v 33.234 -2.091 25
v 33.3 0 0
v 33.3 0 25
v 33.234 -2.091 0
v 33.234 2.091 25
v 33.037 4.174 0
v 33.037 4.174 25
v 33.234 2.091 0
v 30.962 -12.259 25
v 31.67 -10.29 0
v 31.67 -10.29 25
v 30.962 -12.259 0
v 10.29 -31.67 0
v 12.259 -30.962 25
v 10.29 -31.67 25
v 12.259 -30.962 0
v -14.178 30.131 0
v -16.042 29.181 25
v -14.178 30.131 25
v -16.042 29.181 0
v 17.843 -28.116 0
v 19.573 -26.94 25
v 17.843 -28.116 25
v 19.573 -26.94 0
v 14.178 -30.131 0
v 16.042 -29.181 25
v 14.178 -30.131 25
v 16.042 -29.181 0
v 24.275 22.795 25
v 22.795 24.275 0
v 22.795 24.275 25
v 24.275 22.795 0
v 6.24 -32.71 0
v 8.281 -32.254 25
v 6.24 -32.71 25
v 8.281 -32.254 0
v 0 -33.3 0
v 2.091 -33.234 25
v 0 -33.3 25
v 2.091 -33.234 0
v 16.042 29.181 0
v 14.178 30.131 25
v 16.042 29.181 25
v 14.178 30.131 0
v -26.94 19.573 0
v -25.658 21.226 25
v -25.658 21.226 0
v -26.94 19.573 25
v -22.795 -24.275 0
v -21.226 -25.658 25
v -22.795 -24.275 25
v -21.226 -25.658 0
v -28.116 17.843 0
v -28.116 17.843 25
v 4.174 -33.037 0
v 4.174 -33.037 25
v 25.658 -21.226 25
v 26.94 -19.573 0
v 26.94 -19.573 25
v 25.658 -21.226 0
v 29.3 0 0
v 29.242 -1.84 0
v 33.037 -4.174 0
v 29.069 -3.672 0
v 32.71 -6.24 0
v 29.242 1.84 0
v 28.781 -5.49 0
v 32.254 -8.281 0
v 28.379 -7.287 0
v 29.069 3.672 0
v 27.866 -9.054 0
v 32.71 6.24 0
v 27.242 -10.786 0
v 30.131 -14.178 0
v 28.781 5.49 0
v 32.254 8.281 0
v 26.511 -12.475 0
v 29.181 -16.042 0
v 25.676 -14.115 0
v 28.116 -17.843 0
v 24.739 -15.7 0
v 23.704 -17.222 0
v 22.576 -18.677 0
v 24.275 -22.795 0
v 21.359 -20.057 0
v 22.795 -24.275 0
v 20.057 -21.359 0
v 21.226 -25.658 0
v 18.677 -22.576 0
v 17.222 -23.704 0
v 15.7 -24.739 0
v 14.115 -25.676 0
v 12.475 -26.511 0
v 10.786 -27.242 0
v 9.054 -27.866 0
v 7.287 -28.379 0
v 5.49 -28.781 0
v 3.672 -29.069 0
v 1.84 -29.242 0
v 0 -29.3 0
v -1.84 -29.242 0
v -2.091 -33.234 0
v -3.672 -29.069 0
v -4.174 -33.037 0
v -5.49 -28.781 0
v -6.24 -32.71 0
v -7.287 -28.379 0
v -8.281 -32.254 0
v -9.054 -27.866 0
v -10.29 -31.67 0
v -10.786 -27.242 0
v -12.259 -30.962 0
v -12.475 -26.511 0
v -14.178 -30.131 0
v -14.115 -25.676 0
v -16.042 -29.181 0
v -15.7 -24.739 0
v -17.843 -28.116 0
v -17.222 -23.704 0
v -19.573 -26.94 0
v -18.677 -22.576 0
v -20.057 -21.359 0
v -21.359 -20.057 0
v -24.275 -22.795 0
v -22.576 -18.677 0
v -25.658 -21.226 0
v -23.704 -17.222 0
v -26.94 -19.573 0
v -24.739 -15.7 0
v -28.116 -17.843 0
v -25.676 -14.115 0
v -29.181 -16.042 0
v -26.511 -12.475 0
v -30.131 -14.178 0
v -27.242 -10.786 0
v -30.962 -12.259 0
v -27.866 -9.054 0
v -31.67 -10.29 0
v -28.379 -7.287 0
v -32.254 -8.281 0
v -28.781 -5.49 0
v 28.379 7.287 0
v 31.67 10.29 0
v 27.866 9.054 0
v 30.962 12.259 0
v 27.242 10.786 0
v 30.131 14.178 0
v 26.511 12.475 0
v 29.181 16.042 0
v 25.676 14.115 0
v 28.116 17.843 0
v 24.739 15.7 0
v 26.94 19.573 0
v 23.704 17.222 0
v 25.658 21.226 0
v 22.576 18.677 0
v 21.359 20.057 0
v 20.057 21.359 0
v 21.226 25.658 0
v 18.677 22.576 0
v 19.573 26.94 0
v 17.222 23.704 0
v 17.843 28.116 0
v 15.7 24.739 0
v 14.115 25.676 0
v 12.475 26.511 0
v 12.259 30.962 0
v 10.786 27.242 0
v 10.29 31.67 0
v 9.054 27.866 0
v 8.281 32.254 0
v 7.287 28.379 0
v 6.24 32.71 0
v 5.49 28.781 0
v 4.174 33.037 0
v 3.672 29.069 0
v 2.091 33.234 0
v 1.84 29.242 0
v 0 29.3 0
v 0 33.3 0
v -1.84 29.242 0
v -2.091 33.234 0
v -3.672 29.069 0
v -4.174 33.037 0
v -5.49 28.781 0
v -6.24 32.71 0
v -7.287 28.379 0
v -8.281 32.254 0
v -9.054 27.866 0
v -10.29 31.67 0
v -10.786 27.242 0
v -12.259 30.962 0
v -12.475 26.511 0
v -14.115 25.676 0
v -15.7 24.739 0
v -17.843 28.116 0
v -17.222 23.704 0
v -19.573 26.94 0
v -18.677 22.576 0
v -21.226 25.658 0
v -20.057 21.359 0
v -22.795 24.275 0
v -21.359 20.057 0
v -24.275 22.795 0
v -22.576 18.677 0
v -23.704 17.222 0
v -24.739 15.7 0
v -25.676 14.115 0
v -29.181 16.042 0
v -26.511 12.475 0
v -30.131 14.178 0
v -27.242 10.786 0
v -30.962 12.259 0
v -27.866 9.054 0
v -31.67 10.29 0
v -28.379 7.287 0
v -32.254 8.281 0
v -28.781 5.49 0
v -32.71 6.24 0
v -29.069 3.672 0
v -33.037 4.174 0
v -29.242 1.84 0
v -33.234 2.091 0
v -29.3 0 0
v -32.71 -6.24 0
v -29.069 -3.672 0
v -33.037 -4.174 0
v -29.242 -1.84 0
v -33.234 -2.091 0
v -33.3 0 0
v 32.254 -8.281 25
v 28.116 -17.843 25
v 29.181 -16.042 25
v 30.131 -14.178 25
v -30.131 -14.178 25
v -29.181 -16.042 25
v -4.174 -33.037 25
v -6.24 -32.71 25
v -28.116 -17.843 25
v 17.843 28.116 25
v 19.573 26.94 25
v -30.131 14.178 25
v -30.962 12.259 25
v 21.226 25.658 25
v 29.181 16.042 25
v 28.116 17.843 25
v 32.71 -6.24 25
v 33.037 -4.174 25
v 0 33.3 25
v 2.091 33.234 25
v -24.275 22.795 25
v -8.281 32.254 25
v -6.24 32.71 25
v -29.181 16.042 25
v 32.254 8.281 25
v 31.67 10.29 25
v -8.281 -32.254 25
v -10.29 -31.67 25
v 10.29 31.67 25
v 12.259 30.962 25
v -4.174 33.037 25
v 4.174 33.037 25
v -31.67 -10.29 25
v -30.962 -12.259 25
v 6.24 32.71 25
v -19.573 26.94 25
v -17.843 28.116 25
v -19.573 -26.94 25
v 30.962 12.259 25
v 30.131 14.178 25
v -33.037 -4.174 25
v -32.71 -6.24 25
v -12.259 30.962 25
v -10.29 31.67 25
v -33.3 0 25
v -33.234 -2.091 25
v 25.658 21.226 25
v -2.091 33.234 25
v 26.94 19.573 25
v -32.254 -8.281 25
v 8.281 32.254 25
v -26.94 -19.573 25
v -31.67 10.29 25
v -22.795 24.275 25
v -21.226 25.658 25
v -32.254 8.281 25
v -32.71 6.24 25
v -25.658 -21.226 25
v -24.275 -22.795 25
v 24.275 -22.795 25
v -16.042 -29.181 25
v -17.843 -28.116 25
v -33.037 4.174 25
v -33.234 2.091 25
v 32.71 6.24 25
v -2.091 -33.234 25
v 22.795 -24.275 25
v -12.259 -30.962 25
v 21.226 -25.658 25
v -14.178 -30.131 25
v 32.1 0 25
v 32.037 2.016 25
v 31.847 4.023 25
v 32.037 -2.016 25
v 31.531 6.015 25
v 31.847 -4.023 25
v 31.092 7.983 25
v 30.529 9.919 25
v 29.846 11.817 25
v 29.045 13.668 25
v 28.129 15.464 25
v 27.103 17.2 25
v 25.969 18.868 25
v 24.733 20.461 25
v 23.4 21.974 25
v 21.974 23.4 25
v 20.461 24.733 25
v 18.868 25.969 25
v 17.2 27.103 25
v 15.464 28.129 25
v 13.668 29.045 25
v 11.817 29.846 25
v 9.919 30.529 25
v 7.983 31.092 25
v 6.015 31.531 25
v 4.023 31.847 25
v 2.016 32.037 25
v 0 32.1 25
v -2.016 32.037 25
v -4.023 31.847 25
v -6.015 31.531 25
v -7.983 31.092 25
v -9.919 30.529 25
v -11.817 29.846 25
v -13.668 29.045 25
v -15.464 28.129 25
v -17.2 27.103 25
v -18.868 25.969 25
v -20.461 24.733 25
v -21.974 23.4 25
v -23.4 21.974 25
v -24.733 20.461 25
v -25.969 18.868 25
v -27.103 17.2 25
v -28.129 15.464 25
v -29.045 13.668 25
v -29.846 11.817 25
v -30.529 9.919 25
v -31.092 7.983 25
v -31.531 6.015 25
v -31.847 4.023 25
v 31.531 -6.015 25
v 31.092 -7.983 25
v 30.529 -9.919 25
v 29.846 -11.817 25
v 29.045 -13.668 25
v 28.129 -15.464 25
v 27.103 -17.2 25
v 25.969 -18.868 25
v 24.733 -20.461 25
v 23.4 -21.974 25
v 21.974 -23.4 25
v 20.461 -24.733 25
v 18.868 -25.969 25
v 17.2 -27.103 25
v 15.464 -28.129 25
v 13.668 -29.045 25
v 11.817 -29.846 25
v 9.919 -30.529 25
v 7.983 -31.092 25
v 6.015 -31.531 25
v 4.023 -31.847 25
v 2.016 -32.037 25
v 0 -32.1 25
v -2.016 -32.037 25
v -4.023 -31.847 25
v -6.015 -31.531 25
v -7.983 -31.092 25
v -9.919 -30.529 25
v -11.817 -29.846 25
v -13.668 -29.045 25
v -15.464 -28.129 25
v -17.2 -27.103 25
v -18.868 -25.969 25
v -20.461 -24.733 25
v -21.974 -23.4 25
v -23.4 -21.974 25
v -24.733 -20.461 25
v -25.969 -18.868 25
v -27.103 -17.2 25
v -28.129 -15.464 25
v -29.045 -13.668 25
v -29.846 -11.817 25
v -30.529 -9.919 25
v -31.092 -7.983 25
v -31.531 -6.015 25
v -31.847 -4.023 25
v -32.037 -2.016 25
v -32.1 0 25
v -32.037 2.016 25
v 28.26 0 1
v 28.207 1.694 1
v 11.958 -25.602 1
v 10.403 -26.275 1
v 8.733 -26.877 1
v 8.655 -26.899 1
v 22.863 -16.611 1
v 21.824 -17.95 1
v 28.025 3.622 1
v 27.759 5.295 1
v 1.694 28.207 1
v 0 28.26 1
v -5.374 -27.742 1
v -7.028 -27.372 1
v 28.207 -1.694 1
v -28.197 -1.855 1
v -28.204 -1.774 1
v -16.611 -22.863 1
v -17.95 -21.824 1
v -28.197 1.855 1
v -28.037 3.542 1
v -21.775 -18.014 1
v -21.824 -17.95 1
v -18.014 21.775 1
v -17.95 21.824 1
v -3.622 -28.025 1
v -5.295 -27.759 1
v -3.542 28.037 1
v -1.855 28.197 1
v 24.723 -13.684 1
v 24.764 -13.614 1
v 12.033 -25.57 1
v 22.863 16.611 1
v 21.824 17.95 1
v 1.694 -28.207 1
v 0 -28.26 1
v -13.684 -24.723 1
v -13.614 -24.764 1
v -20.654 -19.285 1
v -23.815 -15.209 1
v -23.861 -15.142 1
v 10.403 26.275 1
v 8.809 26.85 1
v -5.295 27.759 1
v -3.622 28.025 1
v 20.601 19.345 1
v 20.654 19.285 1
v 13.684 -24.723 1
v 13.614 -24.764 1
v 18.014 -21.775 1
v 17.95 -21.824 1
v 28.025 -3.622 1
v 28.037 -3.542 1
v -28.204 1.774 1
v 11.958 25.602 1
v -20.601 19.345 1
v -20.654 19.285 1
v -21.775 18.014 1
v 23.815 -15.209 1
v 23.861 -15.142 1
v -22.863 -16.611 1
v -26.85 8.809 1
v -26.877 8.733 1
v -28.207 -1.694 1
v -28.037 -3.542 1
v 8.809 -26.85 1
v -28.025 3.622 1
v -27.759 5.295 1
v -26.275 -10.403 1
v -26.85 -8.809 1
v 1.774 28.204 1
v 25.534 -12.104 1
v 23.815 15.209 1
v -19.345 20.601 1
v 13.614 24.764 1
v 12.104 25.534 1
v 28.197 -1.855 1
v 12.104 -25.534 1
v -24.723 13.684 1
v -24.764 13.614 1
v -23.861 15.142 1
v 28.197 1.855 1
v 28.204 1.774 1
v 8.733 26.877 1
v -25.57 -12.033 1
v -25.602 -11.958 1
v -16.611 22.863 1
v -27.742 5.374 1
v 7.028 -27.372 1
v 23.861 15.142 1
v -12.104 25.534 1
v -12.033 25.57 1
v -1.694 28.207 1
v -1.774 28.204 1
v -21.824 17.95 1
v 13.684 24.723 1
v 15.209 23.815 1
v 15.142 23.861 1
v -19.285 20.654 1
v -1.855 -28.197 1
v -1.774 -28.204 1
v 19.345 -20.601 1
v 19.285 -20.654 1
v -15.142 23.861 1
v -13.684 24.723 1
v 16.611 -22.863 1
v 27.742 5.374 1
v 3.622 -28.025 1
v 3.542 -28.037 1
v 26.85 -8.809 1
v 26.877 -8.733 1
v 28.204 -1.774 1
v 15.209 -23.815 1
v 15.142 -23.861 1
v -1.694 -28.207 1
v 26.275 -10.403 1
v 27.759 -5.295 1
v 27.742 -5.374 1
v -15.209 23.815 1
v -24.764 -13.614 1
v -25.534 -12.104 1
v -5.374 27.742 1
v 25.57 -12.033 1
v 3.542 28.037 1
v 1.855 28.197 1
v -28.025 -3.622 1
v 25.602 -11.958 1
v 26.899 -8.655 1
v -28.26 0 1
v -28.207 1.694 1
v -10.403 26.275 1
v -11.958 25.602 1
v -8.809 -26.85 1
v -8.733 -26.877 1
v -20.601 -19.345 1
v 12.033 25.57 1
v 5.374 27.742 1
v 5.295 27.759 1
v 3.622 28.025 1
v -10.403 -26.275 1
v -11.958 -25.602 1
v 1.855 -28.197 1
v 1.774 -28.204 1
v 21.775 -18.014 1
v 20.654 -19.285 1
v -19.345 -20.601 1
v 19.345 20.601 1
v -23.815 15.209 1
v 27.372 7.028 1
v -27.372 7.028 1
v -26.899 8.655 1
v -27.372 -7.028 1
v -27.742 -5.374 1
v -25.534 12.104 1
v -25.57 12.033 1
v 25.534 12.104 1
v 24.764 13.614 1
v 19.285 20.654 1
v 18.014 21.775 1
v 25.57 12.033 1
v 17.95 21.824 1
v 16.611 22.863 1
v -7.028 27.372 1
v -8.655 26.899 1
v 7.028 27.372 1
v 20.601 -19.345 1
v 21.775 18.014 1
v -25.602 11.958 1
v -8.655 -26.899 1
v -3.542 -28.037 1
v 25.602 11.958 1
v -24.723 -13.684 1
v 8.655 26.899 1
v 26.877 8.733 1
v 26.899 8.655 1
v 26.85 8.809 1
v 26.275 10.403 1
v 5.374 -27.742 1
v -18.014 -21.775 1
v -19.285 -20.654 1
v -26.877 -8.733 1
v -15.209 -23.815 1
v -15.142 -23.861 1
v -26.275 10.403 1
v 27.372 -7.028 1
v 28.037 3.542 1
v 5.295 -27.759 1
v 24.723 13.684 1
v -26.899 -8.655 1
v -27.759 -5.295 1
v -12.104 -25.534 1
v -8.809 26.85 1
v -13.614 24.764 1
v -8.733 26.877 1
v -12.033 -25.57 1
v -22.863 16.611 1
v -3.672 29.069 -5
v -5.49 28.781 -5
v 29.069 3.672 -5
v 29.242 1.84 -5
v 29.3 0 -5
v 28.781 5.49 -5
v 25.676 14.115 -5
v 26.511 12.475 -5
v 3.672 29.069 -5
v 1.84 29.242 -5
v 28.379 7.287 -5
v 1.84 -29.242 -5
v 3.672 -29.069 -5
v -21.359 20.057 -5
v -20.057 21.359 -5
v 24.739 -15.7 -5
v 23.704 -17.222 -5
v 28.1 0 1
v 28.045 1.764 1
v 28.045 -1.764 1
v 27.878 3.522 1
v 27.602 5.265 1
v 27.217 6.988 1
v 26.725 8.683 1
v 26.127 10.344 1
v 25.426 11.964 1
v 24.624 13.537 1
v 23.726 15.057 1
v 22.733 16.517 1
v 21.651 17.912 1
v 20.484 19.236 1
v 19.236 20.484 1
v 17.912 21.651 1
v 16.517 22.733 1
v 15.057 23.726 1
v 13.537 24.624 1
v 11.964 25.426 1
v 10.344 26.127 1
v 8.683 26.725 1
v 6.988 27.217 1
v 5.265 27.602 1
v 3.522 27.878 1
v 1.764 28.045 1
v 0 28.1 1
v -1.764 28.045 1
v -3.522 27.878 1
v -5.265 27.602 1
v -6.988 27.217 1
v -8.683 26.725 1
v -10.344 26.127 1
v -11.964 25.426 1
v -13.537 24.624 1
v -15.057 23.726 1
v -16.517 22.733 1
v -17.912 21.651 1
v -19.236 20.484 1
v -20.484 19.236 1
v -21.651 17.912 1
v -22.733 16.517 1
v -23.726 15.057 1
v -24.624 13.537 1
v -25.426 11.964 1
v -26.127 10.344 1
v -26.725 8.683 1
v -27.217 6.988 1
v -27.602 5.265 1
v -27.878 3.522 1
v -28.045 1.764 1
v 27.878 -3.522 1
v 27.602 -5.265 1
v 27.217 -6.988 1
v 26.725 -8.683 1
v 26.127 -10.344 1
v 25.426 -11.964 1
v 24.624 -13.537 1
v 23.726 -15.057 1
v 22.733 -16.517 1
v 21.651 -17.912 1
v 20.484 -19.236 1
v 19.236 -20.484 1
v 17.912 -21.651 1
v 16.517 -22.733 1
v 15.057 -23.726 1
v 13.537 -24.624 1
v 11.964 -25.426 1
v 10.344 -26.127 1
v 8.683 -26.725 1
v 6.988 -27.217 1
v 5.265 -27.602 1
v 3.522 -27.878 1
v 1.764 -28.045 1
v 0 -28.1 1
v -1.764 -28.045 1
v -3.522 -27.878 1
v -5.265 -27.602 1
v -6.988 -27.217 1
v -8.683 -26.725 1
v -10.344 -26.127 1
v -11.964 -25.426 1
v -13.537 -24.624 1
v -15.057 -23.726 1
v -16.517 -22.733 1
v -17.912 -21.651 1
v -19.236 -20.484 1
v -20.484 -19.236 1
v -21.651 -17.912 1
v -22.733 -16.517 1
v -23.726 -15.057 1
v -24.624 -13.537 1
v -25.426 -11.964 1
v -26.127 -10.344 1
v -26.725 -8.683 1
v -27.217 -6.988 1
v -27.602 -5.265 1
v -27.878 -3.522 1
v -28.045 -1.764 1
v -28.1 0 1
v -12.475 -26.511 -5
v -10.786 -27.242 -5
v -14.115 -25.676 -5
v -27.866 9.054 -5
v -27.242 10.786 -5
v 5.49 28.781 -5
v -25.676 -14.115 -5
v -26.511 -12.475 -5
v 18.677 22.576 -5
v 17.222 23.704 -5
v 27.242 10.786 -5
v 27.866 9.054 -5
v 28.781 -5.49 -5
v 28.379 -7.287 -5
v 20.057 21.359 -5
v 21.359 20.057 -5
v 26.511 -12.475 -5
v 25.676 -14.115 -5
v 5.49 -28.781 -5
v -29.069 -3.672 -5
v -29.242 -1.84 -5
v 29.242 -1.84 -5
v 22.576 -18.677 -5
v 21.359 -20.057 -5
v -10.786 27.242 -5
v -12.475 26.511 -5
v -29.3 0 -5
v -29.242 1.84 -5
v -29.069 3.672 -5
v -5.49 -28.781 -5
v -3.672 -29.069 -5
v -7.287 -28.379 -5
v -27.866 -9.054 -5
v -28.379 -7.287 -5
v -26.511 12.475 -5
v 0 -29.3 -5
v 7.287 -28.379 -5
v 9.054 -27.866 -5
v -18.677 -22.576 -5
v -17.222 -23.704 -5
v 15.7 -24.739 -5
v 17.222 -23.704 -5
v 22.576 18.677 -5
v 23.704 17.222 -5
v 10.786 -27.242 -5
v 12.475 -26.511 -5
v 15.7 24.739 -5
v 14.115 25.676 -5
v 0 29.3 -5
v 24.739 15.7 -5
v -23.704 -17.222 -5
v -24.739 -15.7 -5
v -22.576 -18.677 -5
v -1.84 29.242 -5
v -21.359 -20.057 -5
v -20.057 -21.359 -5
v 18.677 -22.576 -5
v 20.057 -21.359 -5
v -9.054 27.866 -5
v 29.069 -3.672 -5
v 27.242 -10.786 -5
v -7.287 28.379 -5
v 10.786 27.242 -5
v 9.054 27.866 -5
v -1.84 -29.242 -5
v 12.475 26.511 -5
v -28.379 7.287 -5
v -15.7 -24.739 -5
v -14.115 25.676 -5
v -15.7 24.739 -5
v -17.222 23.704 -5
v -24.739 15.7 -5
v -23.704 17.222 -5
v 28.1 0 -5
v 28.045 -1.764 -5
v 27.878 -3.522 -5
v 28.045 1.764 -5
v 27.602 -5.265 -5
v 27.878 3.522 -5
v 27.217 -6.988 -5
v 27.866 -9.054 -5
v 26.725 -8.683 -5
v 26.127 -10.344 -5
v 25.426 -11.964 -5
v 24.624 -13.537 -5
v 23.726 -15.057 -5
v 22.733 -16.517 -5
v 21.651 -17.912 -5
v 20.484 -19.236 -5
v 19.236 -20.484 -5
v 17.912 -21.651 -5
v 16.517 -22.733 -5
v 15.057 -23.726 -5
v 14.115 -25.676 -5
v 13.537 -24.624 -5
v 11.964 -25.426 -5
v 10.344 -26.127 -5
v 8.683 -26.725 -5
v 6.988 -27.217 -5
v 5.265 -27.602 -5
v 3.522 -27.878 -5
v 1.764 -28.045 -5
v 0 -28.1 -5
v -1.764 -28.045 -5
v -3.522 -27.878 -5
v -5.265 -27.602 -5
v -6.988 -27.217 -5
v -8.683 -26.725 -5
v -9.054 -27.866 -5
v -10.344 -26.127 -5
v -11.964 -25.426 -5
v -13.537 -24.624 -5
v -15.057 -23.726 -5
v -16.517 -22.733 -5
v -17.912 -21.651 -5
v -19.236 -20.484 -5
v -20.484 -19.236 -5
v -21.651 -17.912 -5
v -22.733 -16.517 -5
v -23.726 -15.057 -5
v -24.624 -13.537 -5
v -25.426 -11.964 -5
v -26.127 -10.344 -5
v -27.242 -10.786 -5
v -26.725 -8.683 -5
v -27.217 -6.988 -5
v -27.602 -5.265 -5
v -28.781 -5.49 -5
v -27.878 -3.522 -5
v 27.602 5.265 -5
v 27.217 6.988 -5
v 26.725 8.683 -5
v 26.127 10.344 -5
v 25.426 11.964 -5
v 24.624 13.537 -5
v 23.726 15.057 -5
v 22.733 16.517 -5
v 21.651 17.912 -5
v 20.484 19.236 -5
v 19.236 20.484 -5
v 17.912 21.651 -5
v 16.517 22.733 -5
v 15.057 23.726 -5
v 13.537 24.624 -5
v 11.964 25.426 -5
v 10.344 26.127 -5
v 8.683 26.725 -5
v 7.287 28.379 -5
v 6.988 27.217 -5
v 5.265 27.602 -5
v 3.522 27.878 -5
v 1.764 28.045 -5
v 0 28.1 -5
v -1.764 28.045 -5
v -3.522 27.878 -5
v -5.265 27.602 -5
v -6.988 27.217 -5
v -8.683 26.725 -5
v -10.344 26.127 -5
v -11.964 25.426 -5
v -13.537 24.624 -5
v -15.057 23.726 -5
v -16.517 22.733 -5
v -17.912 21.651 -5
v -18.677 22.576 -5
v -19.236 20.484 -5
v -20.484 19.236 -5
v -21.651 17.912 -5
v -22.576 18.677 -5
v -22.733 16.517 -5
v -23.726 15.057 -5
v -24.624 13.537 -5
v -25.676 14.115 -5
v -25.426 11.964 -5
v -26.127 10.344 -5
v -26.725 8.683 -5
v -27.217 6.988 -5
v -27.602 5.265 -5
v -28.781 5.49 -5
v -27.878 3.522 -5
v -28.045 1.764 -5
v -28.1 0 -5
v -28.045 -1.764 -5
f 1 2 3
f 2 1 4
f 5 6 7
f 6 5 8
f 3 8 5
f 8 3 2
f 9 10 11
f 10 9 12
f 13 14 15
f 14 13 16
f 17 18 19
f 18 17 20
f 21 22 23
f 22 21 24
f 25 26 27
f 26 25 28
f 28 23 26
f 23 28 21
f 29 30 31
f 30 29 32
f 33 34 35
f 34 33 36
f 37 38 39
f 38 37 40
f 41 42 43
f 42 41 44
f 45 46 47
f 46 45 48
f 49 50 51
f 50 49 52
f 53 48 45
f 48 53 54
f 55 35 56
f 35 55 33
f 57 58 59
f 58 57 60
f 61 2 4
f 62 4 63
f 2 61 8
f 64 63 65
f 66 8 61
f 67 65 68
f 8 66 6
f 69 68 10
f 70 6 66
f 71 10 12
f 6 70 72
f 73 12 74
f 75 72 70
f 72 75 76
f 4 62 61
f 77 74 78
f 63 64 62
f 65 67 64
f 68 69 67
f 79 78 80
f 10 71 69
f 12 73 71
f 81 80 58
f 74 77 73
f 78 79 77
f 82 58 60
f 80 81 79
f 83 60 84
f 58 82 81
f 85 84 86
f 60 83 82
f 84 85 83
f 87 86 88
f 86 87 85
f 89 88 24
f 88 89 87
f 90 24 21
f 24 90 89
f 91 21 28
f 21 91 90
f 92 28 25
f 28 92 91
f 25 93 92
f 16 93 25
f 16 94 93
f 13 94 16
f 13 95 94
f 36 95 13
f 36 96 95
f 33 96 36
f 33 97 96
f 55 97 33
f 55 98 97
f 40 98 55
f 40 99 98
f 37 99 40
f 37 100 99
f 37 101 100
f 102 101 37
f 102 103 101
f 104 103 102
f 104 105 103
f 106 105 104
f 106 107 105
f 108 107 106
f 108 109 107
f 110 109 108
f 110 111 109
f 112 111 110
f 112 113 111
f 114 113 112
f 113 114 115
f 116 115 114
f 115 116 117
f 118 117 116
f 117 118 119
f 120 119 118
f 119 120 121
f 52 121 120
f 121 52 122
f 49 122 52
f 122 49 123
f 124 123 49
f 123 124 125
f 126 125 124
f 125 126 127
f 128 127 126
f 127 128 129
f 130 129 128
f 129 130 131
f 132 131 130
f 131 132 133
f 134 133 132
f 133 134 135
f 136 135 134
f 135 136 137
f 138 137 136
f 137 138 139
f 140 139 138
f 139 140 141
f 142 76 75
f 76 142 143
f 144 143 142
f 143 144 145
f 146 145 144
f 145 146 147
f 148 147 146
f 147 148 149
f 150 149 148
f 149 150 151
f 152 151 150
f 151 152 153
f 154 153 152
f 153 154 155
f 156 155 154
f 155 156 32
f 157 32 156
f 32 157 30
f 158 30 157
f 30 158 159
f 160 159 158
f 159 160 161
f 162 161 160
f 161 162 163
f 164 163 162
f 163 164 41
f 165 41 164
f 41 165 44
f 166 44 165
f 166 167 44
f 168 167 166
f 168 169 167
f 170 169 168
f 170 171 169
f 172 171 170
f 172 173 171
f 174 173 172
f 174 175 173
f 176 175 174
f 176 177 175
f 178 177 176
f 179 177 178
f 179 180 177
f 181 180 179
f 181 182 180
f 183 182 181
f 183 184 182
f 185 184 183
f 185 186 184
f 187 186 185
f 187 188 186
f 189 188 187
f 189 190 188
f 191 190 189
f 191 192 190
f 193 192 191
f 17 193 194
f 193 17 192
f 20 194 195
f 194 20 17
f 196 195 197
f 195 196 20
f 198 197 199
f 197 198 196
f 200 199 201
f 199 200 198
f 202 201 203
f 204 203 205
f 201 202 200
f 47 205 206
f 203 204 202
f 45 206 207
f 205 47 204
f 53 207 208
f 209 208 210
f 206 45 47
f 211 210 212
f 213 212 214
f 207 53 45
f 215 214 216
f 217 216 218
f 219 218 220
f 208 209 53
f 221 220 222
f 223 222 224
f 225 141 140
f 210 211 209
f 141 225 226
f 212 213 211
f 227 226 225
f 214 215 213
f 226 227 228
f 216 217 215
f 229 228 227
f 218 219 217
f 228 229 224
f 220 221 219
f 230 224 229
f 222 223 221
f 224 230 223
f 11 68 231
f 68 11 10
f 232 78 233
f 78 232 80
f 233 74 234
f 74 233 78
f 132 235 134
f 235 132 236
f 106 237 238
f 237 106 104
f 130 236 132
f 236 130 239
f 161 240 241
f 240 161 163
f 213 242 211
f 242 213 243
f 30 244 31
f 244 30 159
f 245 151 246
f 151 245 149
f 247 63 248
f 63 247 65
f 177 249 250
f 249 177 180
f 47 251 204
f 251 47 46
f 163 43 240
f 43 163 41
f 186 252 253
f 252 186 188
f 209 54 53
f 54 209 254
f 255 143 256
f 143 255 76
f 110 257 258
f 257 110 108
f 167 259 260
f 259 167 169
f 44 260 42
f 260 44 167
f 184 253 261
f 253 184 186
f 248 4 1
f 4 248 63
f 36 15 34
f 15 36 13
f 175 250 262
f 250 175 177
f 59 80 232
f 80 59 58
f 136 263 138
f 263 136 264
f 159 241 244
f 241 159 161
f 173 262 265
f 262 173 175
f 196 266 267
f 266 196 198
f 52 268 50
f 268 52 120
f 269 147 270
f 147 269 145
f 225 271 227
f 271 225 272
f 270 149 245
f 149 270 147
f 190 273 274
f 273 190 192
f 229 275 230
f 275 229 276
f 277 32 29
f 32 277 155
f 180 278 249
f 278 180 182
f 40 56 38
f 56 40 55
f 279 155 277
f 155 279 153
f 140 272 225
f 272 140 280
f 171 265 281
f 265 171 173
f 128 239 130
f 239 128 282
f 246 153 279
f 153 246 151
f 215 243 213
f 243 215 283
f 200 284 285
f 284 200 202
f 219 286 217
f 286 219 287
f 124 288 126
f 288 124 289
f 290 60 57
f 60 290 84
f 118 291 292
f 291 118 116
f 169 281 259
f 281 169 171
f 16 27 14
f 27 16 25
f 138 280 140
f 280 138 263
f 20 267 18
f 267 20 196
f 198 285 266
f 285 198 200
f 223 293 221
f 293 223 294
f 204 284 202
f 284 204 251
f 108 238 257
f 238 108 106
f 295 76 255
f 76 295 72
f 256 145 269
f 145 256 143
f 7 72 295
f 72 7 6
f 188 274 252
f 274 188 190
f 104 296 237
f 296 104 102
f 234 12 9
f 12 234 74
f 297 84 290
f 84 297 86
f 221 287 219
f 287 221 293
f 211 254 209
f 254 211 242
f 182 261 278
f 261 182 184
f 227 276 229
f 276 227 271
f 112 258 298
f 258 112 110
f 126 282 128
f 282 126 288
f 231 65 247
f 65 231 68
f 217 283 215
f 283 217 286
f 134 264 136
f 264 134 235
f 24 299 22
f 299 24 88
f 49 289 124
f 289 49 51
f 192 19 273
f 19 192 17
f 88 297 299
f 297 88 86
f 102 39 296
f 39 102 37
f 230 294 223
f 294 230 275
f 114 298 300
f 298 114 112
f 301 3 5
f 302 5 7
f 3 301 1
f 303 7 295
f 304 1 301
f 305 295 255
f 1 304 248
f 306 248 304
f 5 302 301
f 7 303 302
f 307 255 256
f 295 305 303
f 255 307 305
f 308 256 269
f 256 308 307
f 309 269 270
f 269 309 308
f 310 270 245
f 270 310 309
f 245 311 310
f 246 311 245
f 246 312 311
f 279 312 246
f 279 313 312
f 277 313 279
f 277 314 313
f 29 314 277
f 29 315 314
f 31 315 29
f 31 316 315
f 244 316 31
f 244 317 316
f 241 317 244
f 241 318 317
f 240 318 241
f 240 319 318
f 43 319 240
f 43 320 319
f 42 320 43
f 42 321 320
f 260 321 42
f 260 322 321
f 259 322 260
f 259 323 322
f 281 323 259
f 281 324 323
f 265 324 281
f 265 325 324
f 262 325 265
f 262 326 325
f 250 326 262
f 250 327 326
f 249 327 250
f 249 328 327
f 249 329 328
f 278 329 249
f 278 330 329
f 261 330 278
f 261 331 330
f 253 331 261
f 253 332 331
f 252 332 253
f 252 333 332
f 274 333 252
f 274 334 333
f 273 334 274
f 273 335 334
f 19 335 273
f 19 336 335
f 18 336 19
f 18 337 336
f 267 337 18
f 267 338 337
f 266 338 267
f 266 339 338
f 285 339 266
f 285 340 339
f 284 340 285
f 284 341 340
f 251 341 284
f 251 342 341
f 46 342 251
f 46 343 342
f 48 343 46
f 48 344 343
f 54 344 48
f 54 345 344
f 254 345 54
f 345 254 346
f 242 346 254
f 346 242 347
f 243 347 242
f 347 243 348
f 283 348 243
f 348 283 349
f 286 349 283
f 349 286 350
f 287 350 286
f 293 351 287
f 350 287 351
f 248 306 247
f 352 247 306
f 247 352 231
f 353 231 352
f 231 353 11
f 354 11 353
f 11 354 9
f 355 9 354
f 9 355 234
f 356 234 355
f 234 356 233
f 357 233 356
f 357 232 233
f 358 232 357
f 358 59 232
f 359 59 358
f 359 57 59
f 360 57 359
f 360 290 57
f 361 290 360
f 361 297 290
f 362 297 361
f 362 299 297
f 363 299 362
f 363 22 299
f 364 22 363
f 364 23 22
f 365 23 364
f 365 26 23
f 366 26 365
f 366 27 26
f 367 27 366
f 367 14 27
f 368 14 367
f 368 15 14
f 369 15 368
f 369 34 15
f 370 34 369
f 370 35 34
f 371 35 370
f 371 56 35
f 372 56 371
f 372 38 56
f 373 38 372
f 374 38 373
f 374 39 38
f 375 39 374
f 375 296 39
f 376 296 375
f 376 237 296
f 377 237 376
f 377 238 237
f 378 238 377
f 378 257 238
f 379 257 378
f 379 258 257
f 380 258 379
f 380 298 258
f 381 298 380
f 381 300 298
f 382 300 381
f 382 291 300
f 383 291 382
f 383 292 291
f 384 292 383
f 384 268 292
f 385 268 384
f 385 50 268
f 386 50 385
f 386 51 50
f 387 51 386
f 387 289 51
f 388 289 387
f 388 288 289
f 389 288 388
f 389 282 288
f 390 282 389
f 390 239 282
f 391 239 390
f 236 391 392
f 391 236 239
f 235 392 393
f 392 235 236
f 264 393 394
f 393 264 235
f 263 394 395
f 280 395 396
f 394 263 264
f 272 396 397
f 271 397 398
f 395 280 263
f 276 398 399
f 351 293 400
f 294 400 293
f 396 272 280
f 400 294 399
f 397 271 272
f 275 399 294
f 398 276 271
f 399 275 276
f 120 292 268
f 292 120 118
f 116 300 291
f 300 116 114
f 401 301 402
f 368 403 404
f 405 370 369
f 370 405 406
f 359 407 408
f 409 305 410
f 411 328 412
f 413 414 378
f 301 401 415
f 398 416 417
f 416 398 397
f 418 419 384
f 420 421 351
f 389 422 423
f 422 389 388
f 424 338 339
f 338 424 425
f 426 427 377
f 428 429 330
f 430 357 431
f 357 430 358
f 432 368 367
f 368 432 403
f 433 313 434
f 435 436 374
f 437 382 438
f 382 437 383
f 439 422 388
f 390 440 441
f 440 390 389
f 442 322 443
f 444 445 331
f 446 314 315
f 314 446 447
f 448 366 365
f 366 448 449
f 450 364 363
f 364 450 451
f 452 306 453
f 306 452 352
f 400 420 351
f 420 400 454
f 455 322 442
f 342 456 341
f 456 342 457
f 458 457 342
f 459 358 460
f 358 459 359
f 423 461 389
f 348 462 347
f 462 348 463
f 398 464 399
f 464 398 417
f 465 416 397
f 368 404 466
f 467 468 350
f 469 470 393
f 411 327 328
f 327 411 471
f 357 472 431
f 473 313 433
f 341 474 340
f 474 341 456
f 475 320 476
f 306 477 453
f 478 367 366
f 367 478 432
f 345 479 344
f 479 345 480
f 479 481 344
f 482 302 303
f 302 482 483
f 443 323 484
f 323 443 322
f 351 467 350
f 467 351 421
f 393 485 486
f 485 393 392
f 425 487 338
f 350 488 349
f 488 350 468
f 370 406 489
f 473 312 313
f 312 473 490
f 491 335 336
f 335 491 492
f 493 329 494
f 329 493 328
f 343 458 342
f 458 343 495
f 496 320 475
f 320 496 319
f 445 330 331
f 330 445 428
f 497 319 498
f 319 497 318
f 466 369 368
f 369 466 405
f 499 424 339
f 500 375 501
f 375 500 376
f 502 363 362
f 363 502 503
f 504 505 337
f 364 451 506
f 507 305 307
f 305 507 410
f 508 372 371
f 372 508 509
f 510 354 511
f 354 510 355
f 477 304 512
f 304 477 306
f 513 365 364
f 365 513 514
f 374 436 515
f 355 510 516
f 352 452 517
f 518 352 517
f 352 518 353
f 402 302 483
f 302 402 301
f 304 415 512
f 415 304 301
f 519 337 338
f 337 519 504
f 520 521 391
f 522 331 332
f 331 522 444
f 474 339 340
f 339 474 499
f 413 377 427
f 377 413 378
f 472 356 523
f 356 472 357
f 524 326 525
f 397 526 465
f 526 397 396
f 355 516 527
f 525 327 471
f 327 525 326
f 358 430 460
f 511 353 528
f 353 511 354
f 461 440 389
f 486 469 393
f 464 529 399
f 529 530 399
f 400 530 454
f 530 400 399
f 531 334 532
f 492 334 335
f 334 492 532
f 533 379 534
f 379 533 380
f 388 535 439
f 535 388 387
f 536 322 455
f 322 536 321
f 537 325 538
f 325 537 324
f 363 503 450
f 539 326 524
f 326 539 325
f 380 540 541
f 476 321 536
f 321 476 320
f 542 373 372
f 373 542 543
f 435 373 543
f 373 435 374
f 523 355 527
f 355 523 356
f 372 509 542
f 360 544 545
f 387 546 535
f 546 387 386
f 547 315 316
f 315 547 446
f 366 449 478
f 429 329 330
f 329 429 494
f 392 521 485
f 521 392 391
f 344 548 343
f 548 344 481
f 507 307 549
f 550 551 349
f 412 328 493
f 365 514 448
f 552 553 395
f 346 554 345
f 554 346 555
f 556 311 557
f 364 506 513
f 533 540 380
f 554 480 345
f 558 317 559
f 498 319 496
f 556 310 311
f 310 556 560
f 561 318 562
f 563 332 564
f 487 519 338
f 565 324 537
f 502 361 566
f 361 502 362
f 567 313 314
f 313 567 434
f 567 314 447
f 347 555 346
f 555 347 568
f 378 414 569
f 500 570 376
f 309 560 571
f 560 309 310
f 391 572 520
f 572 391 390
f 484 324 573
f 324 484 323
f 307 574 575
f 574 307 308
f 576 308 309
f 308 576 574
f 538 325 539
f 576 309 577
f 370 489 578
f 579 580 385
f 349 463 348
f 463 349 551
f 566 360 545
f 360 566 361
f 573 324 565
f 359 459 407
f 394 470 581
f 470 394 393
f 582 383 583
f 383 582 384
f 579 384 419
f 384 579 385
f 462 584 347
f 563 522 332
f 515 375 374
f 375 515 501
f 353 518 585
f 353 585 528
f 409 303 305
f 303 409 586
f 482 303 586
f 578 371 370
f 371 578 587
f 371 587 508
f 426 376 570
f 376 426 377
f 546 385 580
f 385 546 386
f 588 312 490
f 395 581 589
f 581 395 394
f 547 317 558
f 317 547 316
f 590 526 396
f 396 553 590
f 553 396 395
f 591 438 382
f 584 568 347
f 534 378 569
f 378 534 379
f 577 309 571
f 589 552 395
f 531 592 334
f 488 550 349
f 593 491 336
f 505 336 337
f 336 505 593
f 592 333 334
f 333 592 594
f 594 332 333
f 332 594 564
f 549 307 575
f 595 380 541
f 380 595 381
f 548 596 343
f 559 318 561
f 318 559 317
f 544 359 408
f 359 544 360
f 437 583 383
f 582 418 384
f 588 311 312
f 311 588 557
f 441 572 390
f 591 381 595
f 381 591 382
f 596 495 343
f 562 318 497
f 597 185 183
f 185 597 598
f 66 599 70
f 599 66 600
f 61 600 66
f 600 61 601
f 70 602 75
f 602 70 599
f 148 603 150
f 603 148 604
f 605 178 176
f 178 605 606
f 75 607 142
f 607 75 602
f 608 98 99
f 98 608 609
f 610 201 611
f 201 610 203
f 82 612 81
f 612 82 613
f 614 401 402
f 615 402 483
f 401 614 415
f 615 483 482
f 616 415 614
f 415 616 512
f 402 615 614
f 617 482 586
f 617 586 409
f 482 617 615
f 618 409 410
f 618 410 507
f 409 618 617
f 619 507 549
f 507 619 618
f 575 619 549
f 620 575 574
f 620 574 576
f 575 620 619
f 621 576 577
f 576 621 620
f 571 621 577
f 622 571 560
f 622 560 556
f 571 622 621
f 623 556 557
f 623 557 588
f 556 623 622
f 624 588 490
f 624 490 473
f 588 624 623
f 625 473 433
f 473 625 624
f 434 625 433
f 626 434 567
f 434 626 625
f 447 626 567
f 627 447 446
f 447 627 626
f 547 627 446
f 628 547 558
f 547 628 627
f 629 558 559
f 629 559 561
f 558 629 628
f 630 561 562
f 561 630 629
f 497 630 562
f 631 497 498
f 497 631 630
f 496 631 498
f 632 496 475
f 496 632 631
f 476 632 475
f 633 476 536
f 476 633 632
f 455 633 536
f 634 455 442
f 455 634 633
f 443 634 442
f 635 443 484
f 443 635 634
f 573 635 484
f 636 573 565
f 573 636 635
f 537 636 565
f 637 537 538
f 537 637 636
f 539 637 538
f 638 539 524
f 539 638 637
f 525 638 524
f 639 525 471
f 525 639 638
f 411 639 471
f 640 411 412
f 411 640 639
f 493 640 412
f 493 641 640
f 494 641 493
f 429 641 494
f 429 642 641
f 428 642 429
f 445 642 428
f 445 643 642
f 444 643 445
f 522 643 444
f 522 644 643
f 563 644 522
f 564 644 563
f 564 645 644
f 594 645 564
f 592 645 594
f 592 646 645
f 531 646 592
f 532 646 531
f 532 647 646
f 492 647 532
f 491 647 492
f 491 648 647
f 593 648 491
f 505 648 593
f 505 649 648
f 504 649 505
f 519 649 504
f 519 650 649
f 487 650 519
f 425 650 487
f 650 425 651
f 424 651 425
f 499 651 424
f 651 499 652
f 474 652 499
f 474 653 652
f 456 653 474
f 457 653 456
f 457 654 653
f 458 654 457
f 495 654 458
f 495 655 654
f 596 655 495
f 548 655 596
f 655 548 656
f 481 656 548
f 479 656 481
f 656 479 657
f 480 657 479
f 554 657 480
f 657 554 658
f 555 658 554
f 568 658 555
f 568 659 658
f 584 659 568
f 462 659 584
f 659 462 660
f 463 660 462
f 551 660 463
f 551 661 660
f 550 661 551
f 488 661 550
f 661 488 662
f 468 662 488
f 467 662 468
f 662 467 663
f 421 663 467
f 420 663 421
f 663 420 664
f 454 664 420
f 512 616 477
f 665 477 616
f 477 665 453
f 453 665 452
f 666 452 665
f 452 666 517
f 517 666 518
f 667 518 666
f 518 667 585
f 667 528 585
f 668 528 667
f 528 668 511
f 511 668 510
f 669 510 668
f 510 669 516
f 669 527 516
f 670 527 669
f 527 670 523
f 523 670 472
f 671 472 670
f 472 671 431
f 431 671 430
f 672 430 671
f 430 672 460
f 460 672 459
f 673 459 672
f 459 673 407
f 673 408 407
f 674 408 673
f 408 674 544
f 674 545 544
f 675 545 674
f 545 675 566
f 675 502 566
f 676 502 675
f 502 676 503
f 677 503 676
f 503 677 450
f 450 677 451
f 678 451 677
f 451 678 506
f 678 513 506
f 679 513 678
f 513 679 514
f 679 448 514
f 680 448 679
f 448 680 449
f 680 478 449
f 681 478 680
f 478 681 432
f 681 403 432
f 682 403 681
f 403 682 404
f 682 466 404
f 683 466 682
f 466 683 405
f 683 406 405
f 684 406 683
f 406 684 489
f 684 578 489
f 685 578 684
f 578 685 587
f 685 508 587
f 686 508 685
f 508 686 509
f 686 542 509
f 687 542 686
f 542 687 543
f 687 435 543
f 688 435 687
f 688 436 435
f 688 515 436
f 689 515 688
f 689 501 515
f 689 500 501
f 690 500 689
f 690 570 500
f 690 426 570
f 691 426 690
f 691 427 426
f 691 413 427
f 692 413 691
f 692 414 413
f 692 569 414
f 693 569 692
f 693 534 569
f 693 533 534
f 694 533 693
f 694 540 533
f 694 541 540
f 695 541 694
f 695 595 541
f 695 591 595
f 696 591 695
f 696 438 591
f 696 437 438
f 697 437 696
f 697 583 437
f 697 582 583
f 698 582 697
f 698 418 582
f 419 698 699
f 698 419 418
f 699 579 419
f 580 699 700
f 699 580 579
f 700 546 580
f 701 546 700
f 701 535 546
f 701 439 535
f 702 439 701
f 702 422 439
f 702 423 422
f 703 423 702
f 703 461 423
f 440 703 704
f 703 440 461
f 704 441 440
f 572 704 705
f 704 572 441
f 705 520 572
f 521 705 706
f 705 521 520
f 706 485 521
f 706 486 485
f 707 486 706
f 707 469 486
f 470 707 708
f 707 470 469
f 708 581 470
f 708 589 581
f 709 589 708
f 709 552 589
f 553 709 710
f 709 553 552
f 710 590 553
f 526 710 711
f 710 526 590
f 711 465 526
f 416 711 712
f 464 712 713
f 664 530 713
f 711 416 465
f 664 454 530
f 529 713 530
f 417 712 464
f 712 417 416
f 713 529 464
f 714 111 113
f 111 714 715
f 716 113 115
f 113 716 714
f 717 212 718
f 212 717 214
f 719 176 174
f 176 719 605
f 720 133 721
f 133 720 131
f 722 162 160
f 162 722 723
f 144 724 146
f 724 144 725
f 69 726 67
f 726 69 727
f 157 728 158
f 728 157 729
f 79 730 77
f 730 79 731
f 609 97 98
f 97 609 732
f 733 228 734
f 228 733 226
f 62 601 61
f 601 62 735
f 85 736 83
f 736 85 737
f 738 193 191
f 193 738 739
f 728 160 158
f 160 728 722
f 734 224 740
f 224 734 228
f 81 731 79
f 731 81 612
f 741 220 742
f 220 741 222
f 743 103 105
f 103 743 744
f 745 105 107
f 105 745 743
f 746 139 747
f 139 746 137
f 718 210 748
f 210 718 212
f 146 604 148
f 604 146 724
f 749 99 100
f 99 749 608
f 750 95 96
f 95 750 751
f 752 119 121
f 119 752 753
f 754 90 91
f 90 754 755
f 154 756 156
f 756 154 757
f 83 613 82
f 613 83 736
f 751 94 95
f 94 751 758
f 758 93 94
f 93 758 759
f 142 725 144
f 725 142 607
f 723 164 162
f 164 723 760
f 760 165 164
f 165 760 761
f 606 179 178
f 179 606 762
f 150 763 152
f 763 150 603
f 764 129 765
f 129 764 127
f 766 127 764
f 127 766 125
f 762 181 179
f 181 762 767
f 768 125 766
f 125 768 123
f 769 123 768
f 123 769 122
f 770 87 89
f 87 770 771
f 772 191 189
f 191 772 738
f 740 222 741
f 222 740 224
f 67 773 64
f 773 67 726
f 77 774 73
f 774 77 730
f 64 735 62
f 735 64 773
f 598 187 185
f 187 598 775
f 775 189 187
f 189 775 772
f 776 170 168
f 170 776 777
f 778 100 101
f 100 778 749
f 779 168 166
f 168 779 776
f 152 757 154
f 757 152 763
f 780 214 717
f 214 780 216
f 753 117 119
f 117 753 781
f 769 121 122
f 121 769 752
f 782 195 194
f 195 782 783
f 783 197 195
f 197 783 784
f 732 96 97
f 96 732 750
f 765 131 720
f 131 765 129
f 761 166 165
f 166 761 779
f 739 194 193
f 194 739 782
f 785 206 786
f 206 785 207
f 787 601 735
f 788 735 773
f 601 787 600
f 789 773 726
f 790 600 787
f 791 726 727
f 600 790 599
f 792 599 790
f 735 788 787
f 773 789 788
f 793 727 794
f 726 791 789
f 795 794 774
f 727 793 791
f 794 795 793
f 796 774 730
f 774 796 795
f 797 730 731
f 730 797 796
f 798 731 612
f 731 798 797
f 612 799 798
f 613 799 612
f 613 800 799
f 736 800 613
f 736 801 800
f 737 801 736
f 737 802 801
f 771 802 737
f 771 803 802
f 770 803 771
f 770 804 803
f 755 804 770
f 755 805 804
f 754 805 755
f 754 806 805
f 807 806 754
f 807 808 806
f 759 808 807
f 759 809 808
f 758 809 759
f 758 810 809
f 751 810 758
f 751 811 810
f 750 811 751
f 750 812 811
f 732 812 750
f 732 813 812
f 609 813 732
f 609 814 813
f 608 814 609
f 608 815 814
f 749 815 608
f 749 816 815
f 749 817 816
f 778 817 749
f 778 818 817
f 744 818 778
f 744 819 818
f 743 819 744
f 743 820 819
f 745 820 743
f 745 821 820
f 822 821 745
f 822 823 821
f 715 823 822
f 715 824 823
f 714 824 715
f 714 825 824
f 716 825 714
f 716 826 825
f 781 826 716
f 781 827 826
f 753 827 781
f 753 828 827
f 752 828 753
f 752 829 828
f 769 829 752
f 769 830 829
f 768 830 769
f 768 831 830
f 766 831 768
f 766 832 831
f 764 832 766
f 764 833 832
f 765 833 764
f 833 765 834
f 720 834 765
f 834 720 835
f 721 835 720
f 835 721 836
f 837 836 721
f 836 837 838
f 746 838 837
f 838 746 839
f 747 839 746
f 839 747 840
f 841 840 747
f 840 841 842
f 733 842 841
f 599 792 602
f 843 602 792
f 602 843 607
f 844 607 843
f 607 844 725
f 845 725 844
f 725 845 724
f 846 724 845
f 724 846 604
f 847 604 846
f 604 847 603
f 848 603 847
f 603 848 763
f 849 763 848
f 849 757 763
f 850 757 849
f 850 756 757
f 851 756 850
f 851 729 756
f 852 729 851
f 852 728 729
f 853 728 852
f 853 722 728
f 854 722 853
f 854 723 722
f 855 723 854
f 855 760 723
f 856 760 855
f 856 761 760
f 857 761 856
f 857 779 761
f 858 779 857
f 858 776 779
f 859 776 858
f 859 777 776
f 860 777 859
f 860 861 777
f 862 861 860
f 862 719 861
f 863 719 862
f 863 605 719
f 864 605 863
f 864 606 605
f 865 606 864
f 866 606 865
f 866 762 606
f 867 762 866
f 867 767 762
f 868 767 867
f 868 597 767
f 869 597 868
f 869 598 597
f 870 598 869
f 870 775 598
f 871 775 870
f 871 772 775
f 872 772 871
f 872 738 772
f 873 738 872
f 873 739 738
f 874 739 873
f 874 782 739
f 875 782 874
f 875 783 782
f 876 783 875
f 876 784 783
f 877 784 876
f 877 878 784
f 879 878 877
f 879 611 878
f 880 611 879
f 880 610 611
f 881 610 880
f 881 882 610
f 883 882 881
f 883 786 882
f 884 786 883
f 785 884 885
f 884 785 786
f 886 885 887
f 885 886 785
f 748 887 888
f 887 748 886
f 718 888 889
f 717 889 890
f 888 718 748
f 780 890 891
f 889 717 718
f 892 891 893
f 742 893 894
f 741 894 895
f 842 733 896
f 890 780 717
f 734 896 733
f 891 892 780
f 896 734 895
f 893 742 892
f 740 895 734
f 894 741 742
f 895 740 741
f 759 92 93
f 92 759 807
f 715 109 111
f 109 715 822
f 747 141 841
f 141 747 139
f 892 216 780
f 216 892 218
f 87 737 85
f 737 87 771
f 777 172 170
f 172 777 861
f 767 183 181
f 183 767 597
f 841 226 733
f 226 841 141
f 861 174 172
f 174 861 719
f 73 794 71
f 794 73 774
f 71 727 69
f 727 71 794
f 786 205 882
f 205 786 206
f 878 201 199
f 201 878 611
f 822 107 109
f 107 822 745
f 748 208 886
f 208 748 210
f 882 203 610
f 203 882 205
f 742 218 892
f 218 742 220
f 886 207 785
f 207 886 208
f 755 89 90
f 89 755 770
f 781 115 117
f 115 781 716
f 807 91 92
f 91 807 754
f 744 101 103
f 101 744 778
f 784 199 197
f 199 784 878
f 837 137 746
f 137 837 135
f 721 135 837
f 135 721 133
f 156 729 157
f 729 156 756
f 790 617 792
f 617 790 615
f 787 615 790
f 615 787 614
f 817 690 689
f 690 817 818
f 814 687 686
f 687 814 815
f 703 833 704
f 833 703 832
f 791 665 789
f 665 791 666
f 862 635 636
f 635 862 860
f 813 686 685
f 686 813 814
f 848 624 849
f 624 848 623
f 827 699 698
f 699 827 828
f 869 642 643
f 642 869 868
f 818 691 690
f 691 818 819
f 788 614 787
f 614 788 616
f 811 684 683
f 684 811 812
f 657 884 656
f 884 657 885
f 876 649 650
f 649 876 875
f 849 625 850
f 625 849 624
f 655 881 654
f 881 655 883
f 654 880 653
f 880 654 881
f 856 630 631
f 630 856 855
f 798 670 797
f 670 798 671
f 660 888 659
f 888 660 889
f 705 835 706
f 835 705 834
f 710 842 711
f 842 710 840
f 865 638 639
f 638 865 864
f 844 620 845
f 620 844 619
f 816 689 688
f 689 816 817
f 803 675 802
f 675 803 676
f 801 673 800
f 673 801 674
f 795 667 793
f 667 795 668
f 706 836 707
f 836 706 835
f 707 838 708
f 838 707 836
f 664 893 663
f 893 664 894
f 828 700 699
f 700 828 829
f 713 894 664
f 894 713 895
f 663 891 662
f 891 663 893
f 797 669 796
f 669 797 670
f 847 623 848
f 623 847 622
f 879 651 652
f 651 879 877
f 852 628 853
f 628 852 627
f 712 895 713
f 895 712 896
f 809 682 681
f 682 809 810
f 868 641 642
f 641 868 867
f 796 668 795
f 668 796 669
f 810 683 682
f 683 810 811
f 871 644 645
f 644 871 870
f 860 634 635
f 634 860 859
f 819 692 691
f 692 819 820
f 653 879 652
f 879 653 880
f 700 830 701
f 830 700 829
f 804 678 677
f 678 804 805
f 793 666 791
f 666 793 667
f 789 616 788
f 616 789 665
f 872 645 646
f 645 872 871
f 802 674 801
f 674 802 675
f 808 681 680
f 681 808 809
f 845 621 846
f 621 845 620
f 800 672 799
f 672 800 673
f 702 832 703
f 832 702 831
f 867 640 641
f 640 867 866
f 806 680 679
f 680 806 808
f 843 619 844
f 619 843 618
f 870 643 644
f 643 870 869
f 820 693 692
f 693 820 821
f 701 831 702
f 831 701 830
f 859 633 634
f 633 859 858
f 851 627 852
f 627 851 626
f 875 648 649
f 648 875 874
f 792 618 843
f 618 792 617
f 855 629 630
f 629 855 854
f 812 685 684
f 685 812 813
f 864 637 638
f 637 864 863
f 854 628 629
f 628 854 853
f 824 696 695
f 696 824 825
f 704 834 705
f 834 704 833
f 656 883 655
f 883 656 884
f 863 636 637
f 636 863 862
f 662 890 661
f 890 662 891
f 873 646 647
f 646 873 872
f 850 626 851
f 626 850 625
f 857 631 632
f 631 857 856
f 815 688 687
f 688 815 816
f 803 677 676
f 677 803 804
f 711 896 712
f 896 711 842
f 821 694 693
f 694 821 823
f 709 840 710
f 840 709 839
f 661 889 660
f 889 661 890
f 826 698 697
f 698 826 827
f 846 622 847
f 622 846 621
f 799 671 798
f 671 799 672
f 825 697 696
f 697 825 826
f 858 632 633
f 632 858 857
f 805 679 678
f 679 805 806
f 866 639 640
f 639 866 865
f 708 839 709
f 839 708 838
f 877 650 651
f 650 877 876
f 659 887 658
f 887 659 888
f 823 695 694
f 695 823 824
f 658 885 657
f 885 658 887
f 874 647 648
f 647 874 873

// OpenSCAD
R0 = 58.6/2;
R01 = R0-1.2;

//R0 = 70/2 + 1.2;
//R =70/2;
//R2 = 67/2;
R1 = R0 + 4;
R11 = R1 - 1.2;


$fn=100;


difference(){
cylinder(h=25, r=R1);
cylinder(h=25, r1=R01, r2=R11);
}


//difference(){
//cylinder(h=1, r=R+3);
//cylinder(h=1, r=R);
//}


//bottom insert
translate([0,0,-5])
difference(){
cylinder(h=6, r=R0);
cylinder(h=6, r=R01);
}
